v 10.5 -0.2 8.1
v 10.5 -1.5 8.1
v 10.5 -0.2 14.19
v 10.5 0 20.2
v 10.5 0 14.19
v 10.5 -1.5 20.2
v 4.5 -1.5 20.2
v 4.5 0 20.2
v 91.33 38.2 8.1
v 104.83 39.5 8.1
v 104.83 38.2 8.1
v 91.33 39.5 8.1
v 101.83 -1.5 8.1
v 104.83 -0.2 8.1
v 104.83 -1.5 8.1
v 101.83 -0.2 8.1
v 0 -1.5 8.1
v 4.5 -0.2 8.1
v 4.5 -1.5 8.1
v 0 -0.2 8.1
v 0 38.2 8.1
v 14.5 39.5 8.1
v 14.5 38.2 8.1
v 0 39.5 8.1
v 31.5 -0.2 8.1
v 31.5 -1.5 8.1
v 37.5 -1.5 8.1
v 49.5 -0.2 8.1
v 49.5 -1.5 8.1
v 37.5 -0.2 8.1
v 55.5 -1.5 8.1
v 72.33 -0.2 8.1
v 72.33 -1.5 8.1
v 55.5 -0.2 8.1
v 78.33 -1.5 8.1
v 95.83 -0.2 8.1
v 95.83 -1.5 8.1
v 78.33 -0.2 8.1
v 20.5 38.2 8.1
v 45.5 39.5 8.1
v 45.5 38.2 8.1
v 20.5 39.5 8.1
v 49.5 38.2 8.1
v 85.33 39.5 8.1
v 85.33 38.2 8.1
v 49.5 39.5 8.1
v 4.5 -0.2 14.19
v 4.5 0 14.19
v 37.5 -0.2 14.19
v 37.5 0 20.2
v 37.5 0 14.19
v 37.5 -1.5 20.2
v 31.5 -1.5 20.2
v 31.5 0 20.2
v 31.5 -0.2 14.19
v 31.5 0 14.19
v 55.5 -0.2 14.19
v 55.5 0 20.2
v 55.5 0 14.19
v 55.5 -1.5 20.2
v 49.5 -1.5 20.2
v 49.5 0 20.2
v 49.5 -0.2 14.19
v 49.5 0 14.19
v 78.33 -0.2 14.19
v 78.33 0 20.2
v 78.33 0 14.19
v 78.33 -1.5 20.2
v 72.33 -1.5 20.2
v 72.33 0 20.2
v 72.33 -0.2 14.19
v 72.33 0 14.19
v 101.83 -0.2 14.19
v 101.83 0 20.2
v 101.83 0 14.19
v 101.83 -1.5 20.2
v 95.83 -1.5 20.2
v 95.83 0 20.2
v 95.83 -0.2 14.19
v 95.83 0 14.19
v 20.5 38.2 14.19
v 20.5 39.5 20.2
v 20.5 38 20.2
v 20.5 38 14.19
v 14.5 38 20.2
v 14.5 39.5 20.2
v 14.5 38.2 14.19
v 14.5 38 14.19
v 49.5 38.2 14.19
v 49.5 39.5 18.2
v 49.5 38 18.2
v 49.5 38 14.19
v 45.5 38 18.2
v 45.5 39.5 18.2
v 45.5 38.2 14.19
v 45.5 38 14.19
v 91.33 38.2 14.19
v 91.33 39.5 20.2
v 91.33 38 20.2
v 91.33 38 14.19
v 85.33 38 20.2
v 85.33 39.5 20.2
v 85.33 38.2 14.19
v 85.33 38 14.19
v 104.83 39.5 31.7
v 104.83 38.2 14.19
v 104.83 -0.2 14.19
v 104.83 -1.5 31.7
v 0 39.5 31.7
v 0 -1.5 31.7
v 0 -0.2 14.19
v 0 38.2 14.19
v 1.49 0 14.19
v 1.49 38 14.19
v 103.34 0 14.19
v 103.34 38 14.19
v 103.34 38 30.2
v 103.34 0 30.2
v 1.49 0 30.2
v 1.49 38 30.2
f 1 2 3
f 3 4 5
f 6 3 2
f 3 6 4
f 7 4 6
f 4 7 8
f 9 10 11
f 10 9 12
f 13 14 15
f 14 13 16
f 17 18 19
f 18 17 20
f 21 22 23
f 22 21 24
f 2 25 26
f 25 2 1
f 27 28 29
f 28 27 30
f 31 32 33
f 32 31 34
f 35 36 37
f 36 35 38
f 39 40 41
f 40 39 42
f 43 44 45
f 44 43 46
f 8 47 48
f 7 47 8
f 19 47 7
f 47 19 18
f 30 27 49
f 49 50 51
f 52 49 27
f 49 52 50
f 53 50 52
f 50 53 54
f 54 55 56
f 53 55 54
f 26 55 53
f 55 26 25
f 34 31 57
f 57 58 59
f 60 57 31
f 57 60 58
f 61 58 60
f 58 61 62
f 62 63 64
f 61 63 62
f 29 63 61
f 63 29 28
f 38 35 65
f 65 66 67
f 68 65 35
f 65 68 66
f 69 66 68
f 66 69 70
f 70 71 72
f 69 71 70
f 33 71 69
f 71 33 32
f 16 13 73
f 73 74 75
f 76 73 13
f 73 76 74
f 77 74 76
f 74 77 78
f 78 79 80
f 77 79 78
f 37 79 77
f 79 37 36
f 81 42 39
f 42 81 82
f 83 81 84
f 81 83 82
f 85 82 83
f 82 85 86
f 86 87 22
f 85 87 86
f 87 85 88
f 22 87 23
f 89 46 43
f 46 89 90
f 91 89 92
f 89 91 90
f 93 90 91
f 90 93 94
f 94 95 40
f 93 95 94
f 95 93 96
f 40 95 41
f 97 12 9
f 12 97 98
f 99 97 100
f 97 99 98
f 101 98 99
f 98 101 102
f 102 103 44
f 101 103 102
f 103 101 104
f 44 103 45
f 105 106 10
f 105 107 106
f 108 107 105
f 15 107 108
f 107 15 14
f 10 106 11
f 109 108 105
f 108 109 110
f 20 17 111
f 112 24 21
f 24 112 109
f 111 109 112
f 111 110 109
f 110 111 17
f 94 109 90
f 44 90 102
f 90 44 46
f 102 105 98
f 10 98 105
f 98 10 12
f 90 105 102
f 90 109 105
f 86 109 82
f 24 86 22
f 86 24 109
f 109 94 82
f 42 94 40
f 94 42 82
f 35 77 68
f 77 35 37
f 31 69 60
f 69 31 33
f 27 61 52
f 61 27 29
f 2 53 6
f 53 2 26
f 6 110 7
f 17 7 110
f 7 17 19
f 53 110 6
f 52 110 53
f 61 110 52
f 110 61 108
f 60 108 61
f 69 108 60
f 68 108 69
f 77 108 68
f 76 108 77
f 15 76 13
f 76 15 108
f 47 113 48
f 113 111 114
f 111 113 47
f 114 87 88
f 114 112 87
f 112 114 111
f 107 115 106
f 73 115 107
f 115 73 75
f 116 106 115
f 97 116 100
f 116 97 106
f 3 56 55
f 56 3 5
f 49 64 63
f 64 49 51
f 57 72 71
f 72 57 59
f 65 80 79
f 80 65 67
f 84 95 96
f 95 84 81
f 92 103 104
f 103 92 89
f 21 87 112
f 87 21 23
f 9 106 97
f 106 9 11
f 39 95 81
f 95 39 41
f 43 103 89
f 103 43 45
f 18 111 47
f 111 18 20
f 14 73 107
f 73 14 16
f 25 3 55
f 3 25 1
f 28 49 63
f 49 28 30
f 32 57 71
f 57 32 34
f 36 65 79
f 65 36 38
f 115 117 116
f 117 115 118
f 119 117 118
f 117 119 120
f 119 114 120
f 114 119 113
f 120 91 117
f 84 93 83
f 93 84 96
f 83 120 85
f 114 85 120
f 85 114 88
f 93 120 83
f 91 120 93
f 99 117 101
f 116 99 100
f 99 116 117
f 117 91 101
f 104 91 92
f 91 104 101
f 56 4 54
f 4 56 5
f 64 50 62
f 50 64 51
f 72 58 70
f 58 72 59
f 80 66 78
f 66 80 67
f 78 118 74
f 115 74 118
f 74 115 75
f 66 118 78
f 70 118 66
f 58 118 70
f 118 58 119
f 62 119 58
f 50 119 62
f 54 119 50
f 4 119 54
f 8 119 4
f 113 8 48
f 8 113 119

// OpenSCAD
// file: pcb-model-sizes.scad
pcbSmtLvSize=[65.94, 33.75];
pcbDevkitcRelaySize=[57.53, 31.88];
pcbCurrentSensorSize=[35,43.5];

pcbRelayHeight = 16;

pcbThickness = 1.6;
solderThickness = 3;
wallThickness = 1.5;
partitionThickness = 0.8;

caseMargin = 0.2;
// main file
include <pcb-model-sizes.scad>

currentTopStands=[6, 28];
currentBottomStands = [7, 27];
relayTopStands=[9, 42];
relayBottomStands = [12, 41];
standSize = 2;

module relayCurrentCase() {
    maxY = max(pcbCurrentSensorSize[0], pcbDevkitcRelaySize[1]);
    sizeX = 2 * wallThickness + partitionThickness + pcbDevkitcRelaySize[0] + pcbCurrentSensorSize[1];
    relayYOffset = (maxY - pcbDevkitcRelaySize[1]) / 2;
    difference() {
        cube([sizeX, 2 * wallThickness + maxY, wallThickness + pcbThickness + solderThickness]);
        translate([wallThickness - caseMargin, wallThickness + relayYOffset - caseMargin, wallThickness]) {
            cube([pcbDevkitcRelaySize[0] + 2 * caseMargin, pcbDevkitcRelaySize[1] + 2 * caseMargin, pcbThickness + solderThickness + 0.01]);
        }
        translate([wallThickness + pcbDevkitcRelaySize[0] + partitionThickness, wallThickness + (maxY - pcbCurrentSensorSize[0]) / 2, wallThickness]) {
            cube([pcbCurrentSensorSize[1], pcbCurrentSensorSize[0], pcbThickness + solderThickness + 0.01]);
        }
    }
    translate([wallThickness,wallThickness + relayYOffset,wallThickness]) {
        for(stand = relayBottomStands) {
            translate([stand, 0, 0]){
               cube([standSize, standSize, solderThickness]);
            }
        }
    }

    translate([wallThickness,wallThickness + relayYOffset + pcbDevkitcRelaySize[1] - standSize,wallThickness]) {
        for(stand = relayTopStands) {
            translate([stand, 0, 0]){
               #cube([standSize, standSize, solderThickness]);
            }
        }
    }

    translate([wallThickness + pcbDevkitcRelaySize[0] + partitionThickness,wallThickness,wallThickness]) {
        for(stand = currentBottomStands) {
            translate([stand, 0, 0]){
               cube([standSize, standSize, solderThickness]);
            }
        }
    }

    translate([wallThickness + pcbDevkitcRelaySize[0] + partitionThickness,wallThickness + pcbCurrentSensorSize[0] - standSize,wallThickness]) {
        for(stand = currentTopStands) {
            translate([stand, 0, 0]){
               cube([standSize, standSize, solderThickness]);
            }
        }
    }

    translate([0, 0, wallThickness + pcbThickness + solderThickness - 0.01]) {
        translate([wallThickness + caseMargin, 0, 0]) {
            cube([1 * wallThickness, wallThickness, 2 * wallThickness]);
        }

        translate([sizeX - wallThickness - caseMargin - 1 * wallThickness, 0, 0]) {
            cube([1 * wallThickness, wallThickness, 2 * wallThickness]);
        }

        translate([wallThickness + caseMargin, maxY + wallThickness, 0]) {
            cube([2 * wallThickness, wallThickness, 2 * wallThickness]);
        }

        translate([sizeX - wallThickness - caseMargin - 2 * wallThickness, maxY + wallThickness, 0]) {
            cube([2 * wallThickness, wallThickness, 2 * wallThickness]);
        }
    }
}

module relayCurrentCaseTop() {
    maxY = max(pcbCurrentSensorSize[0], pcbDevkitcRelaySize[1]);
    trayHeight = wallThickness + pcbThickness + solderThickness;

    difference() {
        cube([2 * wallThickness + partitionThickness + pcbDevkitcRelaySize[0] + pcbCurrentSensorSize[1], 4 * wallThickness + maxY, wallThickness + pcbThickness + solderThickness + pcbRelayHeight + wallThickness]);
        translate([-0.01, wallThickness - caseMargin, -0.01]) {
            cube([2 * wallThickness + partitionThickness + pcbDevkitcRelaySize[0] + pcbCurrentSensorSize[1] + 0.02, 2 * wallThickness + maxY + 2 * caseMargin, wallThickness + pcbThickness + solderThickness]);
        }
        translate([wallThickness -0.01, wallThickness, wallThickness + pcbThickness + solderThickness - 0.01]) {
            cube([partitionThickness + pcbDevkitcRelaySize[0] + pcbCurrentSensorSize[1] + 0.02, 2 * wallThickness + maxY, pcbRelayHeight + 0.01]);
        }
        for(hole=[[6,6], [33, 6], [51, 6], [pcbDevkitcRelaySize[0] + partitionThickness + 15.5, 6], [pcbDevkitcRelaySize[0] + partitionThickness + 39, 6]]) {
            translate([wallThickness + hole[0] - hole[1] / 2, - 0.01, 0]) {
                cube([hole[1], wallThickness + 0.02, trayHeight + hole[1]]);
            }
        }
        for(hole=[[16,6], [46, 4], [pcbDevkitcRelaySize[0] + partitionThickness + 28.5, 6]]) {
            translate([wallThickness + hole[0] - hole[1] / 2, 3 * wallThickness + maxY - 0.01, 0]) {
                cube([hole[1], wallThickness + 0.02, trayHeight + hole[1]]);
            }
        }
    }
}

*relayCurrentCase();


translate([0, -wallThickness, wallThickness + pcbThickness + solderThickness + 2]) {
    relayCurrentCaseTop();
}
